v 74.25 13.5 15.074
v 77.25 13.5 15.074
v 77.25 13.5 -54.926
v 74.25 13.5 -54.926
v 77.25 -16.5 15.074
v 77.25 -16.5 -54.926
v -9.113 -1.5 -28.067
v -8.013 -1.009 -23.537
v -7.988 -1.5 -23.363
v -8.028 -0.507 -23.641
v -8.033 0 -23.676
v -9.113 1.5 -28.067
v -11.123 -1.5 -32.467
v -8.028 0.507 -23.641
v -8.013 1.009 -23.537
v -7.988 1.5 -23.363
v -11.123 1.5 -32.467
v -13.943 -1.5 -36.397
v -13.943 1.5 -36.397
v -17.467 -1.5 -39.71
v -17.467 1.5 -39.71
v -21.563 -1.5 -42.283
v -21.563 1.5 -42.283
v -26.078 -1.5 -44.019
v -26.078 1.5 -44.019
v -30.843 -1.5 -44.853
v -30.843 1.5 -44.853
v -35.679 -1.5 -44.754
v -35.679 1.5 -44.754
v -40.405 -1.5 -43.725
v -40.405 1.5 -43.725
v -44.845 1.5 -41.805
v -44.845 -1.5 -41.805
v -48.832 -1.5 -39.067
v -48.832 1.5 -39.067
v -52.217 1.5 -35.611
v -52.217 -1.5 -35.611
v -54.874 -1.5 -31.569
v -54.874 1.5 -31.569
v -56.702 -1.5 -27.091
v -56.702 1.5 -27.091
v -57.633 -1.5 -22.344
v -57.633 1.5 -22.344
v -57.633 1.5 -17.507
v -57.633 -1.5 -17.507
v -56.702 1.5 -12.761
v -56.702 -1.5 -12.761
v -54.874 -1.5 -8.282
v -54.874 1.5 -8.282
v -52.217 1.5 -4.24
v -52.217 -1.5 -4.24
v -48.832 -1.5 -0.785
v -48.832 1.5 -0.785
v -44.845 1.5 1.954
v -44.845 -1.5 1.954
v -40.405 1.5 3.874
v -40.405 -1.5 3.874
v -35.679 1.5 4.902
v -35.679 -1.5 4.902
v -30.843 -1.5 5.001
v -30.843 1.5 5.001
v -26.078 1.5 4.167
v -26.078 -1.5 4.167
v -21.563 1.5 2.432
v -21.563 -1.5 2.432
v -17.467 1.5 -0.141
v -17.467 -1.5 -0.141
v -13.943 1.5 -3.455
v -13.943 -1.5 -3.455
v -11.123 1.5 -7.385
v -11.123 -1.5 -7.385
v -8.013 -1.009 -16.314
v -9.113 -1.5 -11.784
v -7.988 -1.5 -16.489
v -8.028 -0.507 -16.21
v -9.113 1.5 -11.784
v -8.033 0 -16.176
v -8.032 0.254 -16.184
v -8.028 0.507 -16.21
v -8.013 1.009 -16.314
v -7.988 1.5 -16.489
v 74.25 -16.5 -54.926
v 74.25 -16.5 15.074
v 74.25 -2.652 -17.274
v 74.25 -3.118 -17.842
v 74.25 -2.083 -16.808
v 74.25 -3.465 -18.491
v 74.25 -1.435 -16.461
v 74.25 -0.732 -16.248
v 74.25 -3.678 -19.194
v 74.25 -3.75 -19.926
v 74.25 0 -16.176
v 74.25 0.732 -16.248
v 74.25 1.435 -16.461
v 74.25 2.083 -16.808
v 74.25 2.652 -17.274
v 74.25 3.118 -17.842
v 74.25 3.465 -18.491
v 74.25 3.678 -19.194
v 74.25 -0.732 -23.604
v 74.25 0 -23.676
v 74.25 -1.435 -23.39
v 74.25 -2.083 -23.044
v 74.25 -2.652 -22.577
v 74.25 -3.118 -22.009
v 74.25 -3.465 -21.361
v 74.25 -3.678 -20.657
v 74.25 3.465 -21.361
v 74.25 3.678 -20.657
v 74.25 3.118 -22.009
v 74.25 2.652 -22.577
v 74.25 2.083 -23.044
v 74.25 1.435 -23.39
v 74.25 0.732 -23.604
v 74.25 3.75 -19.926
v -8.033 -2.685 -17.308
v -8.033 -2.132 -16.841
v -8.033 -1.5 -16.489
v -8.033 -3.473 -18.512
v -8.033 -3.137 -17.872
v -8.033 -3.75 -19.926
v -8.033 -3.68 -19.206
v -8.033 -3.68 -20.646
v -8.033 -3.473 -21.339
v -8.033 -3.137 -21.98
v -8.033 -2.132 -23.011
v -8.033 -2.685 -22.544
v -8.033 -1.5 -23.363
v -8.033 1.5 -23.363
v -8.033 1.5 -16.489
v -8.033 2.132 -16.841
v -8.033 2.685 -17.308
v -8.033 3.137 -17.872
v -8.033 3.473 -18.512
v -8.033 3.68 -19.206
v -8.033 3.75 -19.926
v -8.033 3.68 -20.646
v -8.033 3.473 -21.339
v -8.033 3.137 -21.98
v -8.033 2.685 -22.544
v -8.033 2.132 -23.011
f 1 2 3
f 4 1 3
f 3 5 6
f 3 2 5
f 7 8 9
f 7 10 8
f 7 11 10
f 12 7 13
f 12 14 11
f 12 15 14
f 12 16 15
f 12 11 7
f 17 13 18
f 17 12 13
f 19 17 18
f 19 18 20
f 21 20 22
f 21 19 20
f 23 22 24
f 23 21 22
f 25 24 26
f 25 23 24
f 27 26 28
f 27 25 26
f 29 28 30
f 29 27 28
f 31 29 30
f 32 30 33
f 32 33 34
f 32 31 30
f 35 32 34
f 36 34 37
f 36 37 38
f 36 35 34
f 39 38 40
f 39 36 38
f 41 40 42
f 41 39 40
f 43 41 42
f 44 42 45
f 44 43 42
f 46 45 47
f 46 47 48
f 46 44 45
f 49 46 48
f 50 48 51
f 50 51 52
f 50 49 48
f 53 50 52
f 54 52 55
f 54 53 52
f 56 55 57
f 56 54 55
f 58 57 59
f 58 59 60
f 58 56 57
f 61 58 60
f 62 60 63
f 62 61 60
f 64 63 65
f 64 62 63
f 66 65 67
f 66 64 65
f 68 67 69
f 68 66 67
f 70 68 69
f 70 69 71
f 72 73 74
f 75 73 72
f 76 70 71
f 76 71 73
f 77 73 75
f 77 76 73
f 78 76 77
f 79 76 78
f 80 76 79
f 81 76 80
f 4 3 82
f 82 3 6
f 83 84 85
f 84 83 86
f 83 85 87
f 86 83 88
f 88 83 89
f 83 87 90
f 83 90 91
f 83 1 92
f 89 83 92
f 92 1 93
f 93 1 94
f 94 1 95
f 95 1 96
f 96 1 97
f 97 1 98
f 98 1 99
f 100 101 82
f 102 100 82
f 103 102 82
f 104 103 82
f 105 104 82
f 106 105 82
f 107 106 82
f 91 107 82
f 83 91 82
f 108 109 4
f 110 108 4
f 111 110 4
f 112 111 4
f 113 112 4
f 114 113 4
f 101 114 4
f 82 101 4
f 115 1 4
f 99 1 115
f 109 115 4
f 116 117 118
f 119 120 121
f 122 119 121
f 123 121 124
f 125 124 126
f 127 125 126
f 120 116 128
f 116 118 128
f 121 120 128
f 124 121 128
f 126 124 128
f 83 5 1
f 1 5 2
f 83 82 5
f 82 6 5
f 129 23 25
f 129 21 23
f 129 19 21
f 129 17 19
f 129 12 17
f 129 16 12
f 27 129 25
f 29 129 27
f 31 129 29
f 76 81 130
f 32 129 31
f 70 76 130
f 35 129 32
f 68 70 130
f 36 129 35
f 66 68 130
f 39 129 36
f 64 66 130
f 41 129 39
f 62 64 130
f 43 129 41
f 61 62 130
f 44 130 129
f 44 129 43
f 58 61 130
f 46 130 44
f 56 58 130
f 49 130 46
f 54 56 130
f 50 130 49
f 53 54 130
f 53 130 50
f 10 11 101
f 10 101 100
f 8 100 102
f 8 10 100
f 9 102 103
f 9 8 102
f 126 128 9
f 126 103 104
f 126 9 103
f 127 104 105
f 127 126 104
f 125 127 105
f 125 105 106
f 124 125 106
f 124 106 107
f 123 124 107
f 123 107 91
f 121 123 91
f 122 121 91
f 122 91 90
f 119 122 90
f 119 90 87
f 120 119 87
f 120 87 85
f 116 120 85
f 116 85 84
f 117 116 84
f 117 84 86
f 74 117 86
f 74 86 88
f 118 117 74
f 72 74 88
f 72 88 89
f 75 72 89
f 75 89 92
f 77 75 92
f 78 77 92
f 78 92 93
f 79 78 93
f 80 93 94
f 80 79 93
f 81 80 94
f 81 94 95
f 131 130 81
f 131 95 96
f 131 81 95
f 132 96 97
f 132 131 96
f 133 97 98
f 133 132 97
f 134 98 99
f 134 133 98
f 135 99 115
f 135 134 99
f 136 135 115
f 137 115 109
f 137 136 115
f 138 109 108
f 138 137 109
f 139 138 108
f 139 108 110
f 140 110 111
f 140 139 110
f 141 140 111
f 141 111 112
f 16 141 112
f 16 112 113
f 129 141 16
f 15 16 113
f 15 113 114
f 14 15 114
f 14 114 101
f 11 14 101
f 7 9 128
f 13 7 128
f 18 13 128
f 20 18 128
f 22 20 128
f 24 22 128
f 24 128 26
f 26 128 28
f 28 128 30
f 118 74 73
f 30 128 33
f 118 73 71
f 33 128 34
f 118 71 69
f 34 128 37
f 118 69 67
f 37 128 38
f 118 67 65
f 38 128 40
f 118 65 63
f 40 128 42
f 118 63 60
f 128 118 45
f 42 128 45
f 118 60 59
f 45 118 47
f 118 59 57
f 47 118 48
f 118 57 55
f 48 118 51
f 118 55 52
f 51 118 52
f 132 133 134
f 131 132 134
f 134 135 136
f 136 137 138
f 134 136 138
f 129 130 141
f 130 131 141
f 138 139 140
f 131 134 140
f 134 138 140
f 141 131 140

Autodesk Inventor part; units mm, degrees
ref_plane "YZ Plane" through (0, 0, 0) normal (1, 0, 0) x (0, 1, 0)
ref_plane "XZ Plane" through (0, 0, 0) normal (0, 1, 0) x (-1, 0, 0)
ref_plane "XY Plane" through (0, 0, 0) normal (0, 0, 1) x (1, 0, 0)
sketch "Skizze1" plane through (0, 0, 0) normal (0, 1, 0) x (-1, 0, 0)
  circle A0 centre (32.7504, -19.9257) radius 25
  line L0 (32.7504, -19.9257) -> (-77.2496, -19.9257)
  line L1 (-77.2496, -19.9257) -> (-77.2496, -23.6757)
  line L2 (-77.2496, -23.6757) -> (8.0333, -23.6757)
  line L3 (8.0333, -23.6757) -> (8.0333, -19.9257)
  point P0 (0, 0)
  dimension "d4" = 50
  dimension "d9" = 110
  dimension "d10" = 3.75
extrude "Extrusion1" add sketch "Skizze1" along normal blind 1.5 and the other way blind 1.5 contours L3 L0 A0 | A0 L0 L3
revolve "Umdrehung1" add sketch "Skizze1" angle 360 about axis through (-32.7504, 0, -19.9257) along (1, 0, 0) picked at (7.9809, -22.0108) contours L2 L1 L0 A0 | A0 L0 L3
sketch "Skizze2" plane through (77.2496, 0, -19.9257) normal (1, 0, 0) x (0, 0, -1)
  line L0 (35, -16.5) -> (-35, -16.5)
  line L1 (-35, -16.5) -> (-35, 13.5)
  line L2 (-35, 13.5) -> (35, 13.5)
  line L3 (35, 13.5) -> (35, -16.5)
  line L4 (-25, -1.5) -> (25, -1.5) projected
  line L5 (35, -16.5) -> (-35, 13.5) construction
  line L6 (-35, -16.5) -> (35, 13.5) construction
  point P0 (-19.9257, 0)
  point P1 (0, -1.5)
  point P2 (-3.75, 0)
  point P3 (3.75, 0)
  dimension "d14" = 70
  dimension "d15" = 30
extrude "Extrusion2" add sketch "Skizze2" against normal blind 3
properties part number "Kreisverkehrsschild"
